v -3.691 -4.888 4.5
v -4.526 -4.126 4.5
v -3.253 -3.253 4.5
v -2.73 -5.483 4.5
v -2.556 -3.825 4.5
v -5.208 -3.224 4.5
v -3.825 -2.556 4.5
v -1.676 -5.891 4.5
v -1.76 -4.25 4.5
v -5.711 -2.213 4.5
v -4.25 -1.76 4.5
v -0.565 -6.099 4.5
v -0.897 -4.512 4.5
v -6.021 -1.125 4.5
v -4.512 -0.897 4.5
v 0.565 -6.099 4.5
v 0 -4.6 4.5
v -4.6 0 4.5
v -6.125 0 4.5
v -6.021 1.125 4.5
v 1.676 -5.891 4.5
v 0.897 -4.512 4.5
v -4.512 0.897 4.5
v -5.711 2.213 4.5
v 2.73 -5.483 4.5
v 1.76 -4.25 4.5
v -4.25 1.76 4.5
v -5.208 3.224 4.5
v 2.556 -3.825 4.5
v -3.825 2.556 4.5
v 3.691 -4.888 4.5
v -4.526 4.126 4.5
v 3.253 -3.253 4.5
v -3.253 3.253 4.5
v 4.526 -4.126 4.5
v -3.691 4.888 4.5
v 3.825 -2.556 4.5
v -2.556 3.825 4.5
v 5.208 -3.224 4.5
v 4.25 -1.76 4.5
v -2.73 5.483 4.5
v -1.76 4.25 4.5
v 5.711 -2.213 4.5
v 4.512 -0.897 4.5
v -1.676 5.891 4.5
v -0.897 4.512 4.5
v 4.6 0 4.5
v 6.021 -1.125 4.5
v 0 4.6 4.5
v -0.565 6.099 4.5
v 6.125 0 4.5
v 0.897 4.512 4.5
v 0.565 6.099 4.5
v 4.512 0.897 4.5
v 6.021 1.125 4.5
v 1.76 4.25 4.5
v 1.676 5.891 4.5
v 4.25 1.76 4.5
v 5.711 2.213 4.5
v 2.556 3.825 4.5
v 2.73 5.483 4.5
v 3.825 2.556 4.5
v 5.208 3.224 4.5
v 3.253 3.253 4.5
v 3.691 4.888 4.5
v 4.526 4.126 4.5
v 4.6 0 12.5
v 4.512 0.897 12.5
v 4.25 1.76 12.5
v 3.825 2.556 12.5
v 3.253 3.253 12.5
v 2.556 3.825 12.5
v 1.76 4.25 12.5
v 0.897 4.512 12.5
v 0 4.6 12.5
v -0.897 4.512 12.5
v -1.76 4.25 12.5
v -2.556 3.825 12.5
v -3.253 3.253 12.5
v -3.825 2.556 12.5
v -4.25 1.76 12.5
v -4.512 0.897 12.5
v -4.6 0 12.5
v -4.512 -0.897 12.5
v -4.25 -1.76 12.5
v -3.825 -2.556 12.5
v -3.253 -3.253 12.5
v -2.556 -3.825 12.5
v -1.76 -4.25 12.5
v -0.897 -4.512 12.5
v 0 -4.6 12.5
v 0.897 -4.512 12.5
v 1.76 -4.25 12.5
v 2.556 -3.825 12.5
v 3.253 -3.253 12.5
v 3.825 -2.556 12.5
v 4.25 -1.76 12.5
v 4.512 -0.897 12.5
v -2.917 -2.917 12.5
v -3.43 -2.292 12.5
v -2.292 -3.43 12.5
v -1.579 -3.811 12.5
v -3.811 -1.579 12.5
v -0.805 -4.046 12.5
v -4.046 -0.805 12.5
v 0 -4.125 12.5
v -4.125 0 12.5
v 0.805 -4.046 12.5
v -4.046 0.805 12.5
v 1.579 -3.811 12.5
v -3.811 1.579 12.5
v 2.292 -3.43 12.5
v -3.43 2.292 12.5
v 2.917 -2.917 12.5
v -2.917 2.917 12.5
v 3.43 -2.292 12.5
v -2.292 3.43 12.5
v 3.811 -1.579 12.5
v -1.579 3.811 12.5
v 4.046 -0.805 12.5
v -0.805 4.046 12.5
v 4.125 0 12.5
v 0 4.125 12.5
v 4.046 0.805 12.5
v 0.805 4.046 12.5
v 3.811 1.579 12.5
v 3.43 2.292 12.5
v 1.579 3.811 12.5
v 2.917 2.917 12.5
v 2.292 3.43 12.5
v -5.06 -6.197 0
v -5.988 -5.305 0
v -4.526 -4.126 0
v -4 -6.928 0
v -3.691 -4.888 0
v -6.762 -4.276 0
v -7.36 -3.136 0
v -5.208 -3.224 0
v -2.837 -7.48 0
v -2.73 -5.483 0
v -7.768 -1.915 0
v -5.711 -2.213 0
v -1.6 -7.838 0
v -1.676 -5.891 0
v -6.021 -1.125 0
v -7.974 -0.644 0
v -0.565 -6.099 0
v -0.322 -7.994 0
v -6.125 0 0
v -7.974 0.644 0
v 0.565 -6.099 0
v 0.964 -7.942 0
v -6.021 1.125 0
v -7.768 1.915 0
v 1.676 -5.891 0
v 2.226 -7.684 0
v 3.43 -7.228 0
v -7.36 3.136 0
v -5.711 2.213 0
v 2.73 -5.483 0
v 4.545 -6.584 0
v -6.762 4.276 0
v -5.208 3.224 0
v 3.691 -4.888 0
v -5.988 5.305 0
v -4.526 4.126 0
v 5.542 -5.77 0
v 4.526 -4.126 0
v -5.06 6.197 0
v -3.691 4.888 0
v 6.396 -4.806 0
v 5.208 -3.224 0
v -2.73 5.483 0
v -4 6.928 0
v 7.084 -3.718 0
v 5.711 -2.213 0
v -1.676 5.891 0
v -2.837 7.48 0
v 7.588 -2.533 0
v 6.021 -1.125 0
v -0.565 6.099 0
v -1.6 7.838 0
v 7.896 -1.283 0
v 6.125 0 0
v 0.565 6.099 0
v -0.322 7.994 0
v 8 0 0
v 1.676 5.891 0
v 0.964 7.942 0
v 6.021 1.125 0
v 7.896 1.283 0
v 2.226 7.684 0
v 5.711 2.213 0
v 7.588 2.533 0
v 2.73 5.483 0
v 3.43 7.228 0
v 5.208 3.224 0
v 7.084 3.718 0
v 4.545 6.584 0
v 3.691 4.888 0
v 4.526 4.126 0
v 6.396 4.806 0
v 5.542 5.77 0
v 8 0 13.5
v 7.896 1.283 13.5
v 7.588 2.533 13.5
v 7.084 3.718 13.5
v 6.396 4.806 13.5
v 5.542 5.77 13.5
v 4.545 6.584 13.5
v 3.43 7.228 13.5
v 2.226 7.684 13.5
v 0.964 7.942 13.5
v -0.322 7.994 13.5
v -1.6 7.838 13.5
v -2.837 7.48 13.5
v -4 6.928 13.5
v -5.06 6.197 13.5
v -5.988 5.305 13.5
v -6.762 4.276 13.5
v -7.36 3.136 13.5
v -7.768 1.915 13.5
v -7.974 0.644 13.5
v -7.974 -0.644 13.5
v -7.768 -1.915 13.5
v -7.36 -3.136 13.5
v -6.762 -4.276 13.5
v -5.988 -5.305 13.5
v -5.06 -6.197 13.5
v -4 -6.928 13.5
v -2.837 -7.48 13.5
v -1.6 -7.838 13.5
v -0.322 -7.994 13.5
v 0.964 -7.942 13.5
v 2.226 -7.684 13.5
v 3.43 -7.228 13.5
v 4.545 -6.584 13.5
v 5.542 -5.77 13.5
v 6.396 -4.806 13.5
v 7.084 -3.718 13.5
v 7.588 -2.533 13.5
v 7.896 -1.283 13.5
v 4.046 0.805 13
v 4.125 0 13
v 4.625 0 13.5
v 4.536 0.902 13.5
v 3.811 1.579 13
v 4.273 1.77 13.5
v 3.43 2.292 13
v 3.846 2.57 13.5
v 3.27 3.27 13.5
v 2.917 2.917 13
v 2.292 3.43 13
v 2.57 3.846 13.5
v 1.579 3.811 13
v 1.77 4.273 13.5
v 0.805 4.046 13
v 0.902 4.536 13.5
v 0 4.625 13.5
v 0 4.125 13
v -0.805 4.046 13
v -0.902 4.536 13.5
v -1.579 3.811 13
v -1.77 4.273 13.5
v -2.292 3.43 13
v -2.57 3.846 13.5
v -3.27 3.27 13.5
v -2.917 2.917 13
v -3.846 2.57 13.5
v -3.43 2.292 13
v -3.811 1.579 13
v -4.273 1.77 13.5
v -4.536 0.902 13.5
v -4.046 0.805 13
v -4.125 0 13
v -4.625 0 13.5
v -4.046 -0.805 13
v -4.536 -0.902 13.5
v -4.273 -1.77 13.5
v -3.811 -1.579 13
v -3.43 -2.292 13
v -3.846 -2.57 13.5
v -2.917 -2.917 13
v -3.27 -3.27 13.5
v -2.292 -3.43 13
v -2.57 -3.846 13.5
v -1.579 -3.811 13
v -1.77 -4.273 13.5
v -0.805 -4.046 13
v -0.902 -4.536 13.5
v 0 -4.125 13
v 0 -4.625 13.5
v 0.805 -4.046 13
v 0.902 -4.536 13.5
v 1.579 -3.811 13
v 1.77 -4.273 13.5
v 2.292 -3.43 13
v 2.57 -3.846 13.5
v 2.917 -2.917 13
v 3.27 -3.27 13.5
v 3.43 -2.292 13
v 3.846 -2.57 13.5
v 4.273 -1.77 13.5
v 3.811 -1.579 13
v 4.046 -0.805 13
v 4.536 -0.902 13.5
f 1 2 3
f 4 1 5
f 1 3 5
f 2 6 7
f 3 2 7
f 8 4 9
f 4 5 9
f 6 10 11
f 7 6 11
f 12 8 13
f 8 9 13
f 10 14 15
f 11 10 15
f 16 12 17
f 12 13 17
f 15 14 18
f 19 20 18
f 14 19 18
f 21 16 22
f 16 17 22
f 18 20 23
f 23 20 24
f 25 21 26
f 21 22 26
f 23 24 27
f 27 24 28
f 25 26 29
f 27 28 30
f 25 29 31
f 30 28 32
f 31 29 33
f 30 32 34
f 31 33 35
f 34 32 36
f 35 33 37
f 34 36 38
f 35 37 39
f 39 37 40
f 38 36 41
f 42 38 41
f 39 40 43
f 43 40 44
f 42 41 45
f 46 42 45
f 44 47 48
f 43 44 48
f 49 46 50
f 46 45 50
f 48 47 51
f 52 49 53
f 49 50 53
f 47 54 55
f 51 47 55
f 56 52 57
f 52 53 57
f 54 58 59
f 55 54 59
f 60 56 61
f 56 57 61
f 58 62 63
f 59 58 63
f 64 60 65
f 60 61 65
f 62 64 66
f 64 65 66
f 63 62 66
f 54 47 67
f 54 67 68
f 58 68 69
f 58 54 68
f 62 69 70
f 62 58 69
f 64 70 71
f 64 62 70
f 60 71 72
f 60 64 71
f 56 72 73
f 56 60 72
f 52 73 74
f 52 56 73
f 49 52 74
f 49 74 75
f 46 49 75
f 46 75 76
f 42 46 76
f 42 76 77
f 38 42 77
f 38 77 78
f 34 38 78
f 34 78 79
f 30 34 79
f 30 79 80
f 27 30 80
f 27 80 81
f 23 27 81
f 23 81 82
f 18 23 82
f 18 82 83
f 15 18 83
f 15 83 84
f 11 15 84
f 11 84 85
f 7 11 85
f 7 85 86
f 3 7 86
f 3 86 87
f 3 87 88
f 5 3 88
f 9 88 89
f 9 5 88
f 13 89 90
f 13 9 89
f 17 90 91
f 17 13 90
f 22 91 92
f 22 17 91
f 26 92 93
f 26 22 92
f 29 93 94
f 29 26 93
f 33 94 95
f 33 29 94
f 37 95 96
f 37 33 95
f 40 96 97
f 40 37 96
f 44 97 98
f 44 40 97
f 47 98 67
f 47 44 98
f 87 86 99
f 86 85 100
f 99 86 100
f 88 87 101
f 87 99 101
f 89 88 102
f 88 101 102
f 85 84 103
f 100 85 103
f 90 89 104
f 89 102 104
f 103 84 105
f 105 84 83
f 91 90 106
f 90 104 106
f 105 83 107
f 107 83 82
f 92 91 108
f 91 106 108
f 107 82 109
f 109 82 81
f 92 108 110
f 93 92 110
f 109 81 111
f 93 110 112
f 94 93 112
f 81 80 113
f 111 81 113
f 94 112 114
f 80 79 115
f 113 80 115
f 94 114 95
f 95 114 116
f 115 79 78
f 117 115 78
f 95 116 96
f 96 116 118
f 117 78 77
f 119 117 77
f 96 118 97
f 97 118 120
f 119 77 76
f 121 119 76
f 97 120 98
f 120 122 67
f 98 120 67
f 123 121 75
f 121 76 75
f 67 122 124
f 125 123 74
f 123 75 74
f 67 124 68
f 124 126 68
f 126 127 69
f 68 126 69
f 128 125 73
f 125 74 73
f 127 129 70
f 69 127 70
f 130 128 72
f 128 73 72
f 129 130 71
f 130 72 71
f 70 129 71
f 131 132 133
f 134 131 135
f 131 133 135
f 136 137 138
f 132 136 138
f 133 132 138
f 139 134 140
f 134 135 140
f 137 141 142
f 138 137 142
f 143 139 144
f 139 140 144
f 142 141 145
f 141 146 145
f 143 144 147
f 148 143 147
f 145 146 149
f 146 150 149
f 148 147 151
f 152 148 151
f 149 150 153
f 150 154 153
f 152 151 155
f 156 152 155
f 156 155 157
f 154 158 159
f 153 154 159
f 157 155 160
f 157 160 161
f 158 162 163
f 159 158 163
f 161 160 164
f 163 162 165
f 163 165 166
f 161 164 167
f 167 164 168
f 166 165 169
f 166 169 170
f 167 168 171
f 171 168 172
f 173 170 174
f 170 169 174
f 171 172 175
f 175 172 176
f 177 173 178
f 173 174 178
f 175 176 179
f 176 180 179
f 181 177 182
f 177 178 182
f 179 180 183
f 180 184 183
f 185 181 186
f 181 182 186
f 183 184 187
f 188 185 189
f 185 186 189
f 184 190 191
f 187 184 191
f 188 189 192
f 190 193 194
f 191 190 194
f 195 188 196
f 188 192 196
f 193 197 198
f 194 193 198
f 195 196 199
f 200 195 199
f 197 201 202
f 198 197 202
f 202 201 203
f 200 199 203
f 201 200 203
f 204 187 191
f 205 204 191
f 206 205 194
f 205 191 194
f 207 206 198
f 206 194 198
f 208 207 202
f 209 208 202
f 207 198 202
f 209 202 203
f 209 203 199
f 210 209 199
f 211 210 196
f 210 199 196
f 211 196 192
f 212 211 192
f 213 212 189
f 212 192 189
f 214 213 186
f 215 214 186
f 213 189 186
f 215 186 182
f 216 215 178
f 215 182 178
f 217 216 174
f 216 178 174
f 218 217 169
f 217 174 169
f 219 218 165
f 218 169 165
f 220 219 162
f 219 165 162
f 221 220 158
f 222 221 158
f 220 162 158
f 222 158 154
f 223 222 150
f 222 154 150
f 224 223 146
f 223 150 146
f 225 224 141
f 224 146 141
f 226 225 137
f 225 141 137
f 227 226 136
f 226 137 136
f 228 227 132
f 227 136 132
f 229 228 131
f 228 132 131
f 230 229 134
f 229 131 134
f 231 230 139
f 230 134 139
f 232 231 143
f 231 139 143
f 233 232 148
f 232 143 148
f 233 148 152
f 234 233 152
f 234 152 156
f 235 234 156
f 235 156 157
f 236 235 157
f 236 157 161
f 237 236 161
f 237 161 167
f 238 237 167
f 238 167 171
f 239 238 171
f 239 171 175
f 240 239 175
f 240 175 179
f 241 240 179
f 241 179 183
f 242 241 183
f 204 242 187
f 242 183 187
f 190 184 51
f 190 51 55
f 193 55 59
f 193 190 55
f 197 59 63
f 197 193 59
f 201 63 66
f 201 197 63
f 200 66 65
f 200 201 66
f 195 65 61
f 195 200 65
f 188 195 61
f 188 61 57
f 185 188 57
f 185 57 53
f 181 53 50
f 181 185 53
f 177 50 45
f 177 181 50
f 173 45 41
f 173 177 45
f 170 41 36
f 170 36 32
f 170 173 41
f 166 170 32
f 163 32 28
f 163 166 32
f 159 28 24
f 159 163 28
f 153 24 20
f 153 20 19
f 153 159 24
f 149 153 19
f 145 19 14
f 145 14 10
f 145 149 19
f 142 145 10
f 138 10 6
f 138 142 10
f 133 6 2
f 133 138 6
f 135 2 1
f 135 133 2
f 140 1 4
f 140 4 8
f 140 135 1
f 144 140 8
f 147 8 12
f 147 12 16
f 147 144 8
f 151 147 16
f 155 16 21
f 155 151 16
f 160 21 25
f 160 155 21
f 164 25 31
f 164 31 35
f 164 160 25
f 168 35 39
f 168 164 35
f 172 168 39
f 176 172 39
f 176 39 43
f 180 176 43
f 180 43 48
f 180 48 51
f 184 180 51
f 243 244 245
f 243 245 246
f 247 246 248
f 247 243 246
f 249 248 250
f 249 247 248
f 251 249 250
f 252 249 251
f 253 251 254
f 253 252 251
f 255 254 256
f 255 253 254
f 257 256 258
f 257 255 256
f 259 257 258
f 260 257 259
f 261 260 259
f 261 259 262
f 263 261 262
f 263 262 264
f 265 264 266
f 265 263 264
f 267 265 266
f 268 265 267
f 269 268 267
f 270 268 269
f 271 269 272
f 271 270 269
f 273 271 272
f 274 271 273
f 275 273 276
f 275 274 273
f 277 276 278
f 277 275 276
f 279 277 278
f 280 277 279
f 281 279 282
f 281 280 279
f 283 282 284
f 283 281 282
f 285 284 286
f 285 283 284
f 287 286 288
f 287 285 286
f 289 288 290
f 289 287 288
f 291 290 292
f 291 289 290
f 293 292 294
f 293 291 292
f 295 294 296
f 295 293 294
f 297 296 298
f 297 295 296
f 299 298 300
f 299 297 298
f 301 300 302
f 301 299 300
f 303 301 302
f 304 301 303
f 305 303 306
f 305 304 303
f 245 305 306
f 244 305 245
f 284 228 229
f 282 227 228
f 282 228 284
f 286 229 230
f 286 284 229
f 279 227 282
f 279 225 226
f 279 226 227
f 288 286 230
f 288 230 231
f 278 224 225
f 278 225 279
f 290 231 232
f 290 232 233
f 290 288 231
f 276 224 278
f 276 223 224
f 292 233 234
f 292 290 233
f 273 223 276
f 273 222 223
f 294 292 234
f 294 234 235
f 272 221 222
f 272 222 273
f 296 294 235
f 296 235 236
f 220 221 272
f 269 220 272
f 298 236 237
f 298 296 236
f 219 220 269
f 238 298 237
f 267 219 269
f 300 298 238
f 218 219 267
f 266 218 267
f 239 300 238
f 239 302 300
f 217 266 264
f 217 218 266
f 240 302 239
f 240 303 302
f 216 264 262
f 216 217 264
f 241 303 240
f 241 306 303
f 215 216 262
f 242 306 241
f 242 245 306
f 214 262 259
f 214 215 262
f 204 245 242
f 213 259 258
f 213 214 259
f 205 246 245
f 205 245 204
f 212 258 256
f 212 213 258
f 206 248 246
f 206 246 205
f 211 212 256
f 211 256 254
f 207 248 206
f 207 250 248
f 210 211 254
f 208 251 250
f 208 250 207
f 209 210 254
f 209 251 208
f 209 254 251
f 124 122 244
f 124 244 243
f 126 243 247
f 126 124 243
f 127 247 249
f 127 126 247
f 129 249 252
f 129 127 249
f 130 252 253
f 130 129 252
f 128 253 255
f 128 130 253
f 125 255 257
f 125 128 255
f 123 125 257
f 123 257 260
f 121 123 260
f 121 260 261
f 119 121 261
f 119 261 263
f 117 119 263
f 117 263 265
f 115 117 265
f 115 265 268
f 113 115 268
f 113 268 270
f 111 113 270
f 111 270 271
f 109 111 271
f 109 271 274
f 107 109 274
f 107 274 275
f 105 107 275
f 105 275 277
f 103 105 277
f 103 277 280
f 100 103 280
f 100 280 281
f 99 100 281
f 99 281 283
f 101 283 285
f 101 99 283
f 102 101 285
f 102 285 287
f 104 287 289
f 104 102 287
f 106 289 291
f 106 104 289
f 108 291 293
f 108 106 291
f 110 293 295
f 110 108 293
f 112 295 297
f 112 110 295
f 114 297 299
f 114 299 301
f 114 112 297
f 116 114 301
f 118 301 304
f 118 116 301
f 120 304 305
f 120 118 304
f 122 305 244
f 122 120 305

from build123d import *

# Parameters (mm, degrees)
F0_R     = 8
F0_R_2   = 4.125
F1_DEPTH = 13.5
F2_R     = 4.6
F3_DEPTH = 12.5
F4_R     = 6.125
F5_DEPTH = 4.5
F6_SIZE  = 0.5


with BuildPart() as f1:
    # F0 (on Top) → F1 (new body)
    with BuildSketch(Plane.XY):
        Circle(F0_R)
        Circle(F0_R_2, mode=Mode.SUBTRACT)
    extrude(amount=F1_DEPTH)

    # F2 (on Top) → F3 (cut)
    with BuildSketch(Plane.XY):
        Circle(F2_R)
    extrude(amount=F3_DEPTH, mode=Mode.SUBTRACT)

    # F4 (on Top) → F5 (cut)
    with BuildSketch(Plane.XY):
        Circle(F4_R)
    extrude(amount=F5_DEPTH, mode=Mode.SUBTRACT)

    # F6
    f6_edges = [f1.edges().sort_by_distance(p)[0] for p in [
        (-4.125, 0, 13.5),
    ]]
    chamfer(f6_edges, length=F6_SIZE)


solid = f1.part
